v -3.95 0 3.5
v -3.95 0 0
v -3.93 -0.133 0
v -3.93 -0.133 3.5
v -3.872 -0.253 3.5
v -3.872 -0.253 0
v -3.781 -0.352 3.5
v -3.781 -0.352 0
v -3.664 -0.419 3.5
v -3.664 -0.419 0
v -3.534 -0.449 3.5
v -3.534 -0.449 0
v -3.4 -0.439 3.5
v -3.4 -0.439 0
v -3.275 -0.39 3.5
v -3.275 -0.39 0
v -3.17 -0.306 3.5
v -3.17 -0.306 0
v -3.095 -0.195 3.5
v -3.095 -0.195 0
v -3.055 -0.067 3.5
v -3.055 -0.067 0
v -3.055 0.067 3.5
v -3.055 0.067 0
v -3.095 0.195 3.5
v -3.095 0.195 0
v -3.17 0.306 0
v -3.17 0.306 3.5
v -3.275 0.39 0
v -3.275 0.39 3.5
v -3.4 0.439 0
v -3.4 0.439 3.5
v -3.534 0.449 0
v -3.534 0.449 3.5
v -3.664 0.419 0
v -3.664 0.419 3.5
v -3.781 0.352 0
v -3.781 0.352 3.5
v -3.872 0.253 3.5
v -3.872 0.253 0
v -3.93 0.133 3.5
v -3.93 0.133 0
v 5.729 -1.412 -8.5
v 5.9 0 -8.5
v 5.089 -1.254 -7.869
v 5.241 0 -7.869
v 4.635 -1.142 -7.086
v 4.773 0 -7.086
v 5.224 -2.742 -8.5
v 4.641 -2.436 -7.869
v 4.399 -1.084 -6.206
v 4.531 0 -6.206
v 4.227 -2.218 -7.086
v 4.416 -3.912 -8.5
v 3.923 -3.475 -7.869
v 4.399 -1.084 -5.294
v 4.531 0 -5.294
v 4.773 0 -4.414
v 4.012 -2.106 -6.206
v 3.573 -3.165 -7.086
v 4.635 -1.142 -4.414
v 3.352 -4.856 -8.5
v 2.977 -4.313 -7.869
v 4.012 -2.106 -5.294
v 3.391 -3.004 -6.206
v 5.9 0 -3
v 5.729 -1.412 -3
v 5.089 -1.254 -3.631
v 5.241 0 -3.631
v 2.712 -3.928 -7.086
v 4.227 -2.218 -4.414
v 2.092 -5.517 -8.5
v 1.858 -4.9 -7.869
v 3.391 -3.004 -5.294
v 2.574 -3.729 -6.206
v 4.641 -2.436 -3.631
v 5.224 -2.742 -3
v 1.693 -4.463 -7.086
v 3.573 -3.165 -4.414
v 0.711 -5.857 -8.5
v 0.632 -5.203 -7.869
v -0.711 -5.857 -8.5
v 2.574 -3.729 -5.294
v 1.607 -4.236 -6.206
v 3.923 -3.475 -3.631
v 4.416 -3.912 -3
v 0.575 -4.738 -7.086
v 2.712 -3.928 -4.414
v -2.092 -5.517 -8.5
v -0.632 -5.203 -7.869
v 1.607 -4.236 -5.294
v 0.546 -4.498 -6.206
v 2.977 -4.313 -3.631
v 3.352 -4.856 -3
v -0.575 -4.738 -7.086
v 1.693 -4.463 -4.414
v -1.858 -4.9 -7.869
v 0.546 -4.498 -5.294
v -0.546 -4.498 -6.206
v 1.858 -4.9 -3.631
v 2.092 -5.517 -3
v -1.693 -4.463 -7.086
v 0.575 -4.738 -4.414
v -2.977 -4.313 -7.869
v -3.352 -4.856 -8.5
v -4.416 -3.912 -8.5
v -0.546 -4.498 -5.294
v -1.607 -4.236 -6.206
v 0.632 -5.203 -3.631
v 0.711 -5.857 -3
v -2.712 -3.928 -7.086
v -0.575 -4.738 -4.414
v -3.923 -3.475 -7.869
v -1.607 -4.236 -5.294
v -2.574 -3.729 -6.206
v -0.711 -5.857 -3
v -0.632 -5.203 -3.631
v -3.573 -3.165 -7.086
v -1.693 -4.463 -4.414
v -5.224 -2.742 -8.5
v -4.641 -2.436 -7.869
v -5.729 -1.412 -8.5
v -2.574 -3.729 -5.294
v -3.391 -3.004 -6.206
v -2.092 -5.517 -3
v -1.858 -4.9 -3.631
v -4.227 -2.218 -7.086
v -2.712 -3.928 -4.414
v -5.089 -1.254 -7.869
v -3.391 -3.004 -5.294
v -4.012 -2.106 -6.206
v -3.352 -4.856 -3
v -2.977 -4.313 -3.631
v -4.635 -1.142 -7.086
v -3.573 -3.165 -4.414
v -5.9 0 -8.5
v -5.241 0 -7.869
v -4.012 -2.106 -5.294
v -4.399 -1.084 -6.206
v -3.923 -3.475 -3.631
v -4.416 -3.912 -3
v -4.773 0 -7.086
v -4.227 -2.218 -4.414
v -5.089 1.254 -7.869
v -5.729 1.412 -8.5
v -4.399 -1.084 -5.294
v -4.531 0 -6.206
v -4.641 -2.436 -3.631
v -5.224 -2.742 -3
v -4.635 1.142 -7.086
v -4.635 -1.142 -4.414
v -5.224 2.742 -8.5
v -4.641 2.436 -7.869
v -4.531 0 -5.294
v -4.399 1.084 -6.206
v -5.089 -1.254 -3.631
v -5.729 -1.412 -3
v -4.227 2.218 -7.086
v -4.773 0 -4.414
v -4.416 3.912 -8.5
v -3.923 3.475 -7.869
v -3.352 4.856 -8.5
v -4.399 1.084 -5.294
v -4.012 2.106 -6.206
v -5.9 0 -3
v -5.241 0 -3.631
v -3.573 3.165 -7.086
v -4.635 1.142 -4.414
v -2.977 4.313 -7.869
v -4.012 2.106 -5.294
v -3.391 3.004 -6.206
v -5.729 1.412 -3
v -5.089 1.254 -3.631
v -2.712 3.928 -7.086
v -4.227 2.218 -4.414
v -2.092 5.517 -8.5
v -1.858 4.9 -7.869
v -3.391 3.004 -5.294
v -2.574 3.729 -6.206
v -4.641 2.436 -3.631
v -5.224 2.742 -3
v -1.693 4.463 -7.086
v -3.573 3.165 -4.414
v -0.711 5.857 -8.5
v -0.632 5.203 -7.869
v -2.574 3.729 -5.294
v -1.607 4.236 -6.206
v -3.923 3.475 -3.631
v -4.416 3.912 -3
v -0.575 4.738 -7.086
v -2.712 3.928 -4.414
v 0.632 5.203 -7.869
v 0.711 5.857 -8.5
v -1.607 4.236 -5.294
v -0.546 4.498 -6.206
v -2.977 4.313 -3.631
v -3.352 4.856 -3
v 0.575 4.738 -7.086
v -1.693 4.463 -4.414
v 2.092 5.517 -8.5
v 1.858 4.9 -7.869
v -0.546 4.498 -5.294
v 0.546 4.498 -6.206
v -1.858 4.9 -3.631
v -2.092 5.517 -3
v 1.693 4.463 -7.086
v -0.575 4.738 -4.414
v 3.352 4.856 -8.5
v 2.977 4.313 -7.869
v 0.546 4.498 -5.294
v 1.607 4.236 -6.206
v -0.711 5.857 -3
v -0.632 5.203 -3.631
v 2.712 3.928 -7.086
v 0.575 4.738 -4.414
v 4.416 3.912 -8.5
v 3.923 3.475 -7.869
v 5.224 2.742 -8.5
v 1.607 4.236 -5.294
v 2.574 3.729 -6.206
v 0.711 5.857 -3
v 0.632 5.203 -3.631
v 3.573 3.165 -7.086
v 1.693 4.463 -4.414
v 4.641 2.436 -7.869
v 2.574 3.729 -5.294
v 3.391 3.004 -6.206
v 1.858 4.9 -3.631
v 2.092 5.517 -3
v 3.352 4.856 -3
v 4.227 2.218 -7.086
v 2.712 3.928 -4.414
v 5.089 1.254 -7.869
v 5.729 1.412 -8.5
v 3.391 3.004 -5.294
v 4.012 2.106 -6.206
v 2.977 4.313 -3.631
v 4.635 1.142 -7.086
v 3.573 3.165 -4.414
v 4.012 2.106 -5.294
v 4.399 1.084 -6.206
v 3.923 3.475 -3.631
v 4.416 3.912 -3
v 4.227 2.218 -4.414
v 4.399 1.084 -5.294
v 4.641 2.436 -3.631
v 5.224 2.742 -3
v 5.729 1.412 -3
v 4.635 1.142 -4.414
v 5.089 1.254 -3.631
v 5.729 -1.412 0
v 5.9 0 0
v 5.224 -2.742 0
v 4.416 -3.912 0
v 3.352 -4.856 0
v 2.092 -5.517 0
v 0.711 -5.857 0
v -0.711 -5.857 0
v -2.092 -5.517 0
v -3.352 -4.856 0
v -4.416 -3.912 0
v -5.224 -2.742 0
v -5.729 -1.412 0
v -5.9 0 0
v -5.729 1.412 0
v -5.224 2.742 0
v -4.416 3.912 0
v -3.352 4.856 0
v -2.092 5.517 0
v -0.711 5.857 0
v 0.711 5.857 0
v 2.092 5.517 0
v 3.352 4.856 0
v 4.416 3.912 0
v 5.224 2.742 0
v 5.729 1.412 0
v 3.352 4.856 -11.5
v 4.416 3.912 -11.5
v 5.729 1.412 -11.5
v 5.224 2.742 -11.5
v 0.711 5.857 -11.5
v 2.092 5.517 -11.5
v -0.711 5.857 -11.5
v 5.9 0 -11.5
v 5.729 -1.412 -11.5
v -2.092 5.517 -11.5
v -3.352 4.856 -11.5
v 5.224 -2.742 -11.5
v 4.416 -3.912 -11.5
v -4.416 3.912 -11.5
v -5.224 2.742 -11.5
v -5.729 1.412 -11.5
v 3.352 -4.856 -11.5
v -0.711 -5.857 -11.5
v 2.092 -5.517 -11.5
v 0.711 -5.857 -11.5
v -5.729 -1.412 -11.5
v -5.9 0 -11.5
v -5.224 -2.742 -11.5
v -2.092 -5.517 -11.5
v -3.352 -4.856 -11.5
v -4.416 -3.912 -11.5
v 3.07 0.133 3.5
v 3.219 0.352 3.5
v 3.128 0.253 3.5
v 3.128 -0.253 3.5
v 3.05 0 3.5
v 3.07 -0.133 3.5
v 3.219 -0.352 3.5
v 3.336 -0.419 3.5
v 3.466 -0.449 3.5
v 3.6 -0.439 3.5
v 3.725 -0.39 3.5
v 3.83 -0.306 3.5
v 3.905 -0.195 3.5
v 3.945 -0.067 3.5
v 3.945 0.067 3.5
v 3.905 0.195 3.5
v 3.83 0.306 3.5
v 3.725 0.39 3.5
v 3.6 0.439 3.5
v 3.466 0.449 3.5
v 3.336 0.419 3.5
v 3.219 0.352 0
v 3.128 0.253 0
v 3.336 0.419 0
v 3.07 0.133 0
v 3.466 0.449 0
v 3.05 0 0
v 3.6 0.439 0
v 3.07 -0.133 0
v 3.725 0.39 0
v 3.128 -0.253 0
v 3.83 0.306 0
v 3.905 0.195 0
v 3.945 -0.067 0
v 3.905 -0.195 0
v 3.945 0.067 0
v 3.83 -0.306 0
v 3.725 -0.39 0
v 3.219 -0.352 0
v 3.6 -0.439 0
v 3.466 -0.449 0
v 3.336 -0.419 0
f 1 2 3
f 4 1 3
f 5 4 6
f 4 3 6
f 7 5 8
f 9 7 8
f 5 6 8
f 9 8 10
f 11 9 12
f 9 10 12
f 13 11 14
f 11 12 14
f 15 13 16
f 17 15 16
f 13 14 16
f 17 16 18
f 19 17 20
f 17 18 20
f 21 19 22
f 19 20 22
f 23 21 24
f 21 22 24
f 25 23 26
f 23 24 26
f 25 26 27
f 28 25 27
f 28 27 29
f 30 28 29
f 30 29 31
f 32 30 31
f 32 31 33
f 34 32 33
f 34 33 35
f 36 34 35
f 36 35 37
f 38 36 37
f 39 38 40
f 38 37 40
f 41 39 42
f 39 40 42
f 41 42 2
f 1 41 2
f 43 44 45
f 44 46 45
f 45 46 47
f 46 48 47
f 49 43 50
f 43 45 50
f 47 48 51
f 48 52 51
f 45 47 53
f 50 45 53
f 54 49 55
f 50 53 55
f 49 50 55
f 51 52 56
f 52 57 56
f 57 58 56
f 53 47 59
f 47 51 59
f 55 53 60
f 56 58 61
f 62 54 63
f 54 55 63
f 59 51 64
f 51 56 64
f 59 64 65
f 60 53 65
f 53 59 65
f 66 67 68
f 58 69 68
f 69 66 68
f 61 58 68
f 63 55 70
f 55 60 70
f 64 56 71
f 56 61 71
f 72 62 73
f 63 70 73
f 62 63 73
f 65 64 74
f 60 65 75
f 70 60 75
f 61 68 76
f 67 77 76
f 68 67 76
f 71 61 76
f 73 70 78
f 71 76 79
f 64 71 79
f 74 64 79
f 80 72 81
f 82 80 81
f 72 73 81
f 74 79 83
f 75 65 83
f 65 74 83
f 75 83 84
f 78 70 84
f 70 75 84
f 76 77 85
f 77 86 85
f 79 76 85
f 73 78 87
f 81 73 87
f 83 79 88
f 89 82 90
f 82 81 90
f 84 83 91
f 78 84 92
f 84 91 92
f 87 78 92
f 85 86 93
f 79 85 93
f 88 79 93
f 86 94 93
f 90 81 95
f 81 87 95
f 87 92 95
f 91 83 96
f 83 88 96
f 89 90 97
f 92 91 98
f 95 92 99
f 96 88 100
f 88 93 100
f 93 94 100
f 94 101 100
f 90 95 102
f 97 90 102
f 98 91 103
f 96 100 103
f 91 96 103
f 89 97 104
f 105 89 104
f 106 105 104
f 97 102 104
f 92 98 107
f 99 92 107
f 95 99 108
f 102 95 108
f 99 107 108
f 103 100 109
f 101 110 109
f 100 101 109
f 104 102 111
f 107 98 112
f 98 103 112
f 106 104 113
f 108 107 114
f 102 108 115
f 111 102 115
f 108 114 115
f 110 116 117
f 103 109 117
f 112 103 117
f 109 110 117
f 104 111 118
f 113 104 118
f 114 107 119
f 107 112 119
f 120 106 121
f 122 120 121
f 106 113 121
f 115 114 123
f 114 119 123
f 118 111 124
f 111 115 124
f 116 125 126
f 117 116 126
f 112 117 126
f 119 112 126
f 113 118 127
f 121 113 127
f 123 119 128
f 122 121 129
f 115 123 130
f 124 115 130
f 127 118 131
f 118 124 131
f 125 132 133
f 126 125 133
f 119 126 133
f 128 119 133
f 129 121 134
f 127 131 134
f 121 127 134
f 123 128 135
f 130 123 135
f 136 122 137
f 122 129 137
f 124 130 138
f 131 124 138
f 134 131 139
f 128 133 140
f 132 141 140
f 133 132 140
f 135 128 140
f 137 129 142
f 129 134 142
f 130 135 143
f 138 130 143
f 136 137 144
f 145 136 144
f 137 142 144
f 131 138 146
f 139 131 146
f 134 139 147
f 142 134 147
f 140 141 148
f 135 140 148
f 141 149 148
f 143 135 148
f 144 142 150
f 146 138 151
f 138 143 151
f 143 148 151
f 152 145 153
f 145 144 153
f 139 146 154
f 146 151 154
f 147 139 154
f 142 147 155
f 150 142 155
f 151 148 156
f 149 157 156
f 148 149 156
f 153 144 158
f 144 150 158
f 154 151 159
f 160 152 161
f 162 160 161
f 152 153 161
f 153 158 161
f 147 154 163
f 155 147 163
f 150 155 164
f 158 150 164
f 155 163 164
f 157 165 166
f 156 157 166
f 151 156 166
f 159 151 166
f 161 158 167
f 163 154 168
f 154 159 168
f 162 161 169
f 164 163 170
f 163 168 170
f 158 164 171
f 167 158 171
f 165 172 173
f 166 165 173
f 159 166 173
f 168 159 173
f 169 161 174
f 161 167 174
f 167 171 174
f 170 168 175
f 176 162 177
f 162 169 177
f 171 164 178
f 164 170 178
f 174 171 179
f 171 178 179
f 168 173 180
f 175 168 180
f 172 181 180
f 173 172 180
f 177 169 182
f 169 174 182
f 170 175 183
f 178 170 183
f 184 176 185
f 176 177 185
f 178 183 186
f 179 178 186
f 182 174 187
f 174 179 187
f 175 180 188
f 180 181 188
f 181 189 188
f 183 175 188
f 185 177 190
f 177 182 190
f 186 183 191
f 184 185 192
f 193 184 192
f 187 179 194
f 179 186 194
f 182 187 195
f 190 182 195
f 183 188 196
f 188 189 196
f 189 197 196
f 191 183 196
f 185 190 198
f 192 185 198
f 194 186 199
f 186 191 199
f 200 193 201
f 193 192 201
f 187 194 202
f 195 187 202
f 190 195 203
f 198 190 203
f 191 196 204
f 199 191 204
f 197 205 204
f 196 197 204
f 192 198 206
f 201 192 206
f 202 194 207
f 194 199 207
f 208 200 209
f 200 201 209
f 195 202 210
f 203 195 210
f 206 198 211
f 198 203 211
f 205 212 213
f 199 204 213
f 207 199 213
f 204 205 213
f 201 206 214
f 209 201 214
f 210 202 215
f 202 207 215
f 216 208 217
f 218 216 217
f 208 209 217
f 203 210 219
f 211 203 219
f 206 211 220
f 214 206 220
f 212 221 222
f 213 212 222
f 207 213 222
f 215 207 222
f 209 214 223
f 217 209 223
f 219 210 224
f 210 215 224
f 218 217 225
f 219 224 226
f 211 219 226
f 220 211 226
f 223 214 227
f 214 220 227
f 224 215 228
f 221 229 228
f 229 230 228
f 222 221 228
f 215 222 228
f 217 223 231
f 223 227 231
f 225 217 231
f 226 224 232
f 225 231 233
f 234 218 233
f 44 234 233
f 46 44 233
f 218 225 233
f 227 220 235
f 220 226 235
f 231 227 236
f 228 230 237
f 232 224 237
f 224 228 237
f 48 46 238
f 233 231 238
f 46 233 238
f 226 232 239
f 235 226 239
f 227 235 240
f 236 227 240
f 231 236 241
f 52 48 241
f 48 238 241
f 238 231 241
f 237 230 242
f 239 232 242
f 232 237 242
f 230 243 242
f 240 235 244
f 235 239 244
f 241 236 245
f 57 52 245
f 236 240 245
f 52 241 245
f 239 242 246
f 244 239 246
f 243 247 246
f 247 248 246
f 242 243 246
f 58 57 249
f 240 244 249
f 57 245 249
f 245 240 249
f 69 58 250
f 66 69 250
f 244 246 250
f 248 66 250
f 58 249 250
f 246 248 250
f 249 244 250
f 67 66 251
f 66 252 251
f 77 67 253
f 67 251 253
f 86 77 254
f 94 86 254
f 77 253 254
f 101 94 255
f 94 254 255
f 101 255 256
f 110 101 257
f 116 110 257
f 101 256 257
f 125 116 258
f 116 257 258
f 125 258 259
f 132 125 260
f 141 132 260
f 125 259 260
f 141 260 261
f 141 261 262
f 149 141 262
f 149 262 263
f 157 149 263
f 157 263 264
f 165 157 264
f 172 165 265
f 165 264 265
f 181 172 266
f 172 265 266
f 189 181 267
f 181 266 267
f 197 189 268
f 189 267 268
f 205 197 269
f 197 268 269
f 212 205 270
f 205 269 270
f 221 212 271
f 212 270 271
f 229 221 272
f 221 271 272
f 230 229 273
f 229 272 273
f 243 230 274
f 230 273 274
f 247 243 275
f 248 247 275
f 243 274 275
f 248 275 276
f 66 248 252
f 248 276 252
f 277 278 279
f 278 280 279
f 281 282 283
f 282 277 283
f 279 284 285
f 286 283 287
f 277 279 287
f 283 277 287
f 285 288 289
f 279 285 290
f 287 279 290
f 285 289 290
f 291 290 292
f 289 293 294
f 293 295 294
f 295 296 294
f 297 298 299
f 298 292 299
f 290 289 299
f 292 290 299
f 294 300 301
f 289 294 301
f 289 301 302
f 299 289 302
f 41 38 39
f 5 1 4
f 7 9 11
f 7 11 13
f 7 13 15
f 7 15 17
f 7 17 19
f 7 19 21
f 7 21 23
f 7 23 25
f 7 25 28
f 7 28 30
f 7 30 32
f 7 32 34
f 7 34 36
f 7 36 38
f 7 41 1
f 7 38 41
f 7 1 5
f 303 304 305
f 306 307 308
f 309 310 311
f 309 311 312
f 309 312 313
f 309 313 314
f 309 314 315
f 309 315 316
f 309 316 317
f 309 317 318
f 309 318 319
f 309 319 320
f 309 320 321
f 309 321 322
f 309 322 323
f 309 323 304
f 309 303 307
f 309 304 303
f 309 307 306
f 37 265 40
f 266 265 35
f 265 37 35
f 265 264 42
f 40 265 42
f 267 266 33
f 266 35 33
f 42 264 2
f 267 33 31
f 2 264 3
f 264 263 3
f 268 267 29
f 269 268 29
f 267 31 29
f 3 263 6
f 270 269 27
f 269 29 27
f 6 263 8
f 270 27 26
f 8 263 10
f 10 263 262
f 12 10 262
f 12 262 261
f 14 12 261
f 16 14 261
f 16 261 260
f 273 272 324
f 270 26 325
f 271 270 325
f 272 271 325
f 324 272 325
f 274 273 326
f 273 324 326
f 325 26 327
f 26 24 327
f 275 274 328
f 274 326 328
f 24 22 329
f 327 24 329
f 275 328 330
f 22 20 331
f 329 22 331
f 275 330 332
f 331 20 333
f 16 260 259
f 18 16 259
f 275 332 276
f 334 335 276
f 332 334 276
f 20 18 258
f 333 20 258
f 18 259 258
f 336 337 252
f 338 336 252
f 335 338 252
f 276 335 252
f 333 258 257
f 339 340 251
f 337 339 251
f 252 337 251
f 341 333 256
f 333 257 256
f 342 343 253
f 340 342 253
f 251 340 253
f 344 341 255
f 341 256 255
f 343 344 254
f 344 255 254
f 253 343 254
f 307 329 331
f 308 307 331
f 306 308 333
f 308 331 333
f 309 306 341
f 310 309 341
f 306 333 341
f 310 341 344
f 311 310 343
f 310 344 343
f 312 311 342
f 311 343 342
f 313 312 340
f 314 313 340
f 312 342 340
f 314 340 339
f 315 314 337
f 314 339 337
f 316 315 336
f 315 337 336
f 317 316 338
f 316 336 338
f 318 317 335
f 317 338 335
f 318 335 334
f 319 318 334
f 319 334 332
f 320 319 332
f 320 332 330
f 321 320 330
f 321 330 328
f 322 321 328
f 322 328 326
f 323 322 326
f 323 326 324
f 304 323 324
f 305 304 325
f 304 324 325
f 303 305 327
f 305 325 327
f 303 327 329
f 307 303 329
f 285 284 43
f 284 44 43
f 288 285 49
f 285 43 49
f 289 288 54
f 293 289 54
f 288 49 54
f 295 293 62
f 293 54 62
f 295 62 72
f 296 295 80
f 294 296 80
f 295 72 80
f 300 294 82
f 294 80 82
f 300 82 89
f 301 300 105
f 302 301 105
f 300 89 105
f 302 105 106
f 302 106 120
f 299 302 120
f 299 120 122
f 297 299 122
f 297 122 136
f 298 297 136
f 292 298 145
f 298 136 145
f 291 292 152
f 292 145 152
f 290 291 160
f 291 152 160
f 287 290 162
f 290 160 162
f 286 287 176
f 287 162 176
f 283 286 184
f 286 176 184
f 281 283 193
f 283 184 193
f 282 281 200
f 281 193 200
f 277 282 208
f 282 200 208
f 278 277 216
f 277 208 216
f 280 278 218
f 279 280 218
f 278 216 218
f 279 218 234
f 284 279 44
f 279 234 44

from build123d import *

# Parameters (mm, degrees)
SKETCH_2_R      = 0.45
EXTRUDE_1_DEPTH = 3.5


with BuildPart() as part:
    # Эскиз1 → Повернуть1 (revolve)
    with BuildSketch(Plane(origin=(0, 0, 0), x_dir=(1, 0, 0), z_dir=(0, 1, 0)), mode=Mode.PRIVATE) as revolve_1_sk:
        with BuildLine():
            Line((0, 0), (0, 11.5))
            Line((0, 11.5), (-5.9, 11.5))
            Line((-5.9, 11.5), (-5.9, 8.5))
            ThreePointArc((-5.9, 8.5), (-4.5, 5.75), (-5.9, 3))
            Line((-5.9, 3), (-5.9, 0))
            Line((-5.9, 0), (0, 0))
        make_face()
    revolve(revolve_1_sk.sketch.rotate(Axis((0, 0, 0), (0, 0, -1)), 180), axis=Axis((0, 0, 0), (0, 0, -1)))

    # Эскиз2 → Бобышка-Вытянуть1 (add)
    with BuildSketch(Plane.XY):
        with Locations(Location((-3.5, 0, 0), (0, 0, 180))):
            Circle(SKETCH_2_R)
        with Locations(Location((3.5, 0, 0), (0, 0, 180))):
            Circle(SKETCH_2_R)
    extrude(amount=EXTRUDE_1_DEPTH)


solid = part.part
